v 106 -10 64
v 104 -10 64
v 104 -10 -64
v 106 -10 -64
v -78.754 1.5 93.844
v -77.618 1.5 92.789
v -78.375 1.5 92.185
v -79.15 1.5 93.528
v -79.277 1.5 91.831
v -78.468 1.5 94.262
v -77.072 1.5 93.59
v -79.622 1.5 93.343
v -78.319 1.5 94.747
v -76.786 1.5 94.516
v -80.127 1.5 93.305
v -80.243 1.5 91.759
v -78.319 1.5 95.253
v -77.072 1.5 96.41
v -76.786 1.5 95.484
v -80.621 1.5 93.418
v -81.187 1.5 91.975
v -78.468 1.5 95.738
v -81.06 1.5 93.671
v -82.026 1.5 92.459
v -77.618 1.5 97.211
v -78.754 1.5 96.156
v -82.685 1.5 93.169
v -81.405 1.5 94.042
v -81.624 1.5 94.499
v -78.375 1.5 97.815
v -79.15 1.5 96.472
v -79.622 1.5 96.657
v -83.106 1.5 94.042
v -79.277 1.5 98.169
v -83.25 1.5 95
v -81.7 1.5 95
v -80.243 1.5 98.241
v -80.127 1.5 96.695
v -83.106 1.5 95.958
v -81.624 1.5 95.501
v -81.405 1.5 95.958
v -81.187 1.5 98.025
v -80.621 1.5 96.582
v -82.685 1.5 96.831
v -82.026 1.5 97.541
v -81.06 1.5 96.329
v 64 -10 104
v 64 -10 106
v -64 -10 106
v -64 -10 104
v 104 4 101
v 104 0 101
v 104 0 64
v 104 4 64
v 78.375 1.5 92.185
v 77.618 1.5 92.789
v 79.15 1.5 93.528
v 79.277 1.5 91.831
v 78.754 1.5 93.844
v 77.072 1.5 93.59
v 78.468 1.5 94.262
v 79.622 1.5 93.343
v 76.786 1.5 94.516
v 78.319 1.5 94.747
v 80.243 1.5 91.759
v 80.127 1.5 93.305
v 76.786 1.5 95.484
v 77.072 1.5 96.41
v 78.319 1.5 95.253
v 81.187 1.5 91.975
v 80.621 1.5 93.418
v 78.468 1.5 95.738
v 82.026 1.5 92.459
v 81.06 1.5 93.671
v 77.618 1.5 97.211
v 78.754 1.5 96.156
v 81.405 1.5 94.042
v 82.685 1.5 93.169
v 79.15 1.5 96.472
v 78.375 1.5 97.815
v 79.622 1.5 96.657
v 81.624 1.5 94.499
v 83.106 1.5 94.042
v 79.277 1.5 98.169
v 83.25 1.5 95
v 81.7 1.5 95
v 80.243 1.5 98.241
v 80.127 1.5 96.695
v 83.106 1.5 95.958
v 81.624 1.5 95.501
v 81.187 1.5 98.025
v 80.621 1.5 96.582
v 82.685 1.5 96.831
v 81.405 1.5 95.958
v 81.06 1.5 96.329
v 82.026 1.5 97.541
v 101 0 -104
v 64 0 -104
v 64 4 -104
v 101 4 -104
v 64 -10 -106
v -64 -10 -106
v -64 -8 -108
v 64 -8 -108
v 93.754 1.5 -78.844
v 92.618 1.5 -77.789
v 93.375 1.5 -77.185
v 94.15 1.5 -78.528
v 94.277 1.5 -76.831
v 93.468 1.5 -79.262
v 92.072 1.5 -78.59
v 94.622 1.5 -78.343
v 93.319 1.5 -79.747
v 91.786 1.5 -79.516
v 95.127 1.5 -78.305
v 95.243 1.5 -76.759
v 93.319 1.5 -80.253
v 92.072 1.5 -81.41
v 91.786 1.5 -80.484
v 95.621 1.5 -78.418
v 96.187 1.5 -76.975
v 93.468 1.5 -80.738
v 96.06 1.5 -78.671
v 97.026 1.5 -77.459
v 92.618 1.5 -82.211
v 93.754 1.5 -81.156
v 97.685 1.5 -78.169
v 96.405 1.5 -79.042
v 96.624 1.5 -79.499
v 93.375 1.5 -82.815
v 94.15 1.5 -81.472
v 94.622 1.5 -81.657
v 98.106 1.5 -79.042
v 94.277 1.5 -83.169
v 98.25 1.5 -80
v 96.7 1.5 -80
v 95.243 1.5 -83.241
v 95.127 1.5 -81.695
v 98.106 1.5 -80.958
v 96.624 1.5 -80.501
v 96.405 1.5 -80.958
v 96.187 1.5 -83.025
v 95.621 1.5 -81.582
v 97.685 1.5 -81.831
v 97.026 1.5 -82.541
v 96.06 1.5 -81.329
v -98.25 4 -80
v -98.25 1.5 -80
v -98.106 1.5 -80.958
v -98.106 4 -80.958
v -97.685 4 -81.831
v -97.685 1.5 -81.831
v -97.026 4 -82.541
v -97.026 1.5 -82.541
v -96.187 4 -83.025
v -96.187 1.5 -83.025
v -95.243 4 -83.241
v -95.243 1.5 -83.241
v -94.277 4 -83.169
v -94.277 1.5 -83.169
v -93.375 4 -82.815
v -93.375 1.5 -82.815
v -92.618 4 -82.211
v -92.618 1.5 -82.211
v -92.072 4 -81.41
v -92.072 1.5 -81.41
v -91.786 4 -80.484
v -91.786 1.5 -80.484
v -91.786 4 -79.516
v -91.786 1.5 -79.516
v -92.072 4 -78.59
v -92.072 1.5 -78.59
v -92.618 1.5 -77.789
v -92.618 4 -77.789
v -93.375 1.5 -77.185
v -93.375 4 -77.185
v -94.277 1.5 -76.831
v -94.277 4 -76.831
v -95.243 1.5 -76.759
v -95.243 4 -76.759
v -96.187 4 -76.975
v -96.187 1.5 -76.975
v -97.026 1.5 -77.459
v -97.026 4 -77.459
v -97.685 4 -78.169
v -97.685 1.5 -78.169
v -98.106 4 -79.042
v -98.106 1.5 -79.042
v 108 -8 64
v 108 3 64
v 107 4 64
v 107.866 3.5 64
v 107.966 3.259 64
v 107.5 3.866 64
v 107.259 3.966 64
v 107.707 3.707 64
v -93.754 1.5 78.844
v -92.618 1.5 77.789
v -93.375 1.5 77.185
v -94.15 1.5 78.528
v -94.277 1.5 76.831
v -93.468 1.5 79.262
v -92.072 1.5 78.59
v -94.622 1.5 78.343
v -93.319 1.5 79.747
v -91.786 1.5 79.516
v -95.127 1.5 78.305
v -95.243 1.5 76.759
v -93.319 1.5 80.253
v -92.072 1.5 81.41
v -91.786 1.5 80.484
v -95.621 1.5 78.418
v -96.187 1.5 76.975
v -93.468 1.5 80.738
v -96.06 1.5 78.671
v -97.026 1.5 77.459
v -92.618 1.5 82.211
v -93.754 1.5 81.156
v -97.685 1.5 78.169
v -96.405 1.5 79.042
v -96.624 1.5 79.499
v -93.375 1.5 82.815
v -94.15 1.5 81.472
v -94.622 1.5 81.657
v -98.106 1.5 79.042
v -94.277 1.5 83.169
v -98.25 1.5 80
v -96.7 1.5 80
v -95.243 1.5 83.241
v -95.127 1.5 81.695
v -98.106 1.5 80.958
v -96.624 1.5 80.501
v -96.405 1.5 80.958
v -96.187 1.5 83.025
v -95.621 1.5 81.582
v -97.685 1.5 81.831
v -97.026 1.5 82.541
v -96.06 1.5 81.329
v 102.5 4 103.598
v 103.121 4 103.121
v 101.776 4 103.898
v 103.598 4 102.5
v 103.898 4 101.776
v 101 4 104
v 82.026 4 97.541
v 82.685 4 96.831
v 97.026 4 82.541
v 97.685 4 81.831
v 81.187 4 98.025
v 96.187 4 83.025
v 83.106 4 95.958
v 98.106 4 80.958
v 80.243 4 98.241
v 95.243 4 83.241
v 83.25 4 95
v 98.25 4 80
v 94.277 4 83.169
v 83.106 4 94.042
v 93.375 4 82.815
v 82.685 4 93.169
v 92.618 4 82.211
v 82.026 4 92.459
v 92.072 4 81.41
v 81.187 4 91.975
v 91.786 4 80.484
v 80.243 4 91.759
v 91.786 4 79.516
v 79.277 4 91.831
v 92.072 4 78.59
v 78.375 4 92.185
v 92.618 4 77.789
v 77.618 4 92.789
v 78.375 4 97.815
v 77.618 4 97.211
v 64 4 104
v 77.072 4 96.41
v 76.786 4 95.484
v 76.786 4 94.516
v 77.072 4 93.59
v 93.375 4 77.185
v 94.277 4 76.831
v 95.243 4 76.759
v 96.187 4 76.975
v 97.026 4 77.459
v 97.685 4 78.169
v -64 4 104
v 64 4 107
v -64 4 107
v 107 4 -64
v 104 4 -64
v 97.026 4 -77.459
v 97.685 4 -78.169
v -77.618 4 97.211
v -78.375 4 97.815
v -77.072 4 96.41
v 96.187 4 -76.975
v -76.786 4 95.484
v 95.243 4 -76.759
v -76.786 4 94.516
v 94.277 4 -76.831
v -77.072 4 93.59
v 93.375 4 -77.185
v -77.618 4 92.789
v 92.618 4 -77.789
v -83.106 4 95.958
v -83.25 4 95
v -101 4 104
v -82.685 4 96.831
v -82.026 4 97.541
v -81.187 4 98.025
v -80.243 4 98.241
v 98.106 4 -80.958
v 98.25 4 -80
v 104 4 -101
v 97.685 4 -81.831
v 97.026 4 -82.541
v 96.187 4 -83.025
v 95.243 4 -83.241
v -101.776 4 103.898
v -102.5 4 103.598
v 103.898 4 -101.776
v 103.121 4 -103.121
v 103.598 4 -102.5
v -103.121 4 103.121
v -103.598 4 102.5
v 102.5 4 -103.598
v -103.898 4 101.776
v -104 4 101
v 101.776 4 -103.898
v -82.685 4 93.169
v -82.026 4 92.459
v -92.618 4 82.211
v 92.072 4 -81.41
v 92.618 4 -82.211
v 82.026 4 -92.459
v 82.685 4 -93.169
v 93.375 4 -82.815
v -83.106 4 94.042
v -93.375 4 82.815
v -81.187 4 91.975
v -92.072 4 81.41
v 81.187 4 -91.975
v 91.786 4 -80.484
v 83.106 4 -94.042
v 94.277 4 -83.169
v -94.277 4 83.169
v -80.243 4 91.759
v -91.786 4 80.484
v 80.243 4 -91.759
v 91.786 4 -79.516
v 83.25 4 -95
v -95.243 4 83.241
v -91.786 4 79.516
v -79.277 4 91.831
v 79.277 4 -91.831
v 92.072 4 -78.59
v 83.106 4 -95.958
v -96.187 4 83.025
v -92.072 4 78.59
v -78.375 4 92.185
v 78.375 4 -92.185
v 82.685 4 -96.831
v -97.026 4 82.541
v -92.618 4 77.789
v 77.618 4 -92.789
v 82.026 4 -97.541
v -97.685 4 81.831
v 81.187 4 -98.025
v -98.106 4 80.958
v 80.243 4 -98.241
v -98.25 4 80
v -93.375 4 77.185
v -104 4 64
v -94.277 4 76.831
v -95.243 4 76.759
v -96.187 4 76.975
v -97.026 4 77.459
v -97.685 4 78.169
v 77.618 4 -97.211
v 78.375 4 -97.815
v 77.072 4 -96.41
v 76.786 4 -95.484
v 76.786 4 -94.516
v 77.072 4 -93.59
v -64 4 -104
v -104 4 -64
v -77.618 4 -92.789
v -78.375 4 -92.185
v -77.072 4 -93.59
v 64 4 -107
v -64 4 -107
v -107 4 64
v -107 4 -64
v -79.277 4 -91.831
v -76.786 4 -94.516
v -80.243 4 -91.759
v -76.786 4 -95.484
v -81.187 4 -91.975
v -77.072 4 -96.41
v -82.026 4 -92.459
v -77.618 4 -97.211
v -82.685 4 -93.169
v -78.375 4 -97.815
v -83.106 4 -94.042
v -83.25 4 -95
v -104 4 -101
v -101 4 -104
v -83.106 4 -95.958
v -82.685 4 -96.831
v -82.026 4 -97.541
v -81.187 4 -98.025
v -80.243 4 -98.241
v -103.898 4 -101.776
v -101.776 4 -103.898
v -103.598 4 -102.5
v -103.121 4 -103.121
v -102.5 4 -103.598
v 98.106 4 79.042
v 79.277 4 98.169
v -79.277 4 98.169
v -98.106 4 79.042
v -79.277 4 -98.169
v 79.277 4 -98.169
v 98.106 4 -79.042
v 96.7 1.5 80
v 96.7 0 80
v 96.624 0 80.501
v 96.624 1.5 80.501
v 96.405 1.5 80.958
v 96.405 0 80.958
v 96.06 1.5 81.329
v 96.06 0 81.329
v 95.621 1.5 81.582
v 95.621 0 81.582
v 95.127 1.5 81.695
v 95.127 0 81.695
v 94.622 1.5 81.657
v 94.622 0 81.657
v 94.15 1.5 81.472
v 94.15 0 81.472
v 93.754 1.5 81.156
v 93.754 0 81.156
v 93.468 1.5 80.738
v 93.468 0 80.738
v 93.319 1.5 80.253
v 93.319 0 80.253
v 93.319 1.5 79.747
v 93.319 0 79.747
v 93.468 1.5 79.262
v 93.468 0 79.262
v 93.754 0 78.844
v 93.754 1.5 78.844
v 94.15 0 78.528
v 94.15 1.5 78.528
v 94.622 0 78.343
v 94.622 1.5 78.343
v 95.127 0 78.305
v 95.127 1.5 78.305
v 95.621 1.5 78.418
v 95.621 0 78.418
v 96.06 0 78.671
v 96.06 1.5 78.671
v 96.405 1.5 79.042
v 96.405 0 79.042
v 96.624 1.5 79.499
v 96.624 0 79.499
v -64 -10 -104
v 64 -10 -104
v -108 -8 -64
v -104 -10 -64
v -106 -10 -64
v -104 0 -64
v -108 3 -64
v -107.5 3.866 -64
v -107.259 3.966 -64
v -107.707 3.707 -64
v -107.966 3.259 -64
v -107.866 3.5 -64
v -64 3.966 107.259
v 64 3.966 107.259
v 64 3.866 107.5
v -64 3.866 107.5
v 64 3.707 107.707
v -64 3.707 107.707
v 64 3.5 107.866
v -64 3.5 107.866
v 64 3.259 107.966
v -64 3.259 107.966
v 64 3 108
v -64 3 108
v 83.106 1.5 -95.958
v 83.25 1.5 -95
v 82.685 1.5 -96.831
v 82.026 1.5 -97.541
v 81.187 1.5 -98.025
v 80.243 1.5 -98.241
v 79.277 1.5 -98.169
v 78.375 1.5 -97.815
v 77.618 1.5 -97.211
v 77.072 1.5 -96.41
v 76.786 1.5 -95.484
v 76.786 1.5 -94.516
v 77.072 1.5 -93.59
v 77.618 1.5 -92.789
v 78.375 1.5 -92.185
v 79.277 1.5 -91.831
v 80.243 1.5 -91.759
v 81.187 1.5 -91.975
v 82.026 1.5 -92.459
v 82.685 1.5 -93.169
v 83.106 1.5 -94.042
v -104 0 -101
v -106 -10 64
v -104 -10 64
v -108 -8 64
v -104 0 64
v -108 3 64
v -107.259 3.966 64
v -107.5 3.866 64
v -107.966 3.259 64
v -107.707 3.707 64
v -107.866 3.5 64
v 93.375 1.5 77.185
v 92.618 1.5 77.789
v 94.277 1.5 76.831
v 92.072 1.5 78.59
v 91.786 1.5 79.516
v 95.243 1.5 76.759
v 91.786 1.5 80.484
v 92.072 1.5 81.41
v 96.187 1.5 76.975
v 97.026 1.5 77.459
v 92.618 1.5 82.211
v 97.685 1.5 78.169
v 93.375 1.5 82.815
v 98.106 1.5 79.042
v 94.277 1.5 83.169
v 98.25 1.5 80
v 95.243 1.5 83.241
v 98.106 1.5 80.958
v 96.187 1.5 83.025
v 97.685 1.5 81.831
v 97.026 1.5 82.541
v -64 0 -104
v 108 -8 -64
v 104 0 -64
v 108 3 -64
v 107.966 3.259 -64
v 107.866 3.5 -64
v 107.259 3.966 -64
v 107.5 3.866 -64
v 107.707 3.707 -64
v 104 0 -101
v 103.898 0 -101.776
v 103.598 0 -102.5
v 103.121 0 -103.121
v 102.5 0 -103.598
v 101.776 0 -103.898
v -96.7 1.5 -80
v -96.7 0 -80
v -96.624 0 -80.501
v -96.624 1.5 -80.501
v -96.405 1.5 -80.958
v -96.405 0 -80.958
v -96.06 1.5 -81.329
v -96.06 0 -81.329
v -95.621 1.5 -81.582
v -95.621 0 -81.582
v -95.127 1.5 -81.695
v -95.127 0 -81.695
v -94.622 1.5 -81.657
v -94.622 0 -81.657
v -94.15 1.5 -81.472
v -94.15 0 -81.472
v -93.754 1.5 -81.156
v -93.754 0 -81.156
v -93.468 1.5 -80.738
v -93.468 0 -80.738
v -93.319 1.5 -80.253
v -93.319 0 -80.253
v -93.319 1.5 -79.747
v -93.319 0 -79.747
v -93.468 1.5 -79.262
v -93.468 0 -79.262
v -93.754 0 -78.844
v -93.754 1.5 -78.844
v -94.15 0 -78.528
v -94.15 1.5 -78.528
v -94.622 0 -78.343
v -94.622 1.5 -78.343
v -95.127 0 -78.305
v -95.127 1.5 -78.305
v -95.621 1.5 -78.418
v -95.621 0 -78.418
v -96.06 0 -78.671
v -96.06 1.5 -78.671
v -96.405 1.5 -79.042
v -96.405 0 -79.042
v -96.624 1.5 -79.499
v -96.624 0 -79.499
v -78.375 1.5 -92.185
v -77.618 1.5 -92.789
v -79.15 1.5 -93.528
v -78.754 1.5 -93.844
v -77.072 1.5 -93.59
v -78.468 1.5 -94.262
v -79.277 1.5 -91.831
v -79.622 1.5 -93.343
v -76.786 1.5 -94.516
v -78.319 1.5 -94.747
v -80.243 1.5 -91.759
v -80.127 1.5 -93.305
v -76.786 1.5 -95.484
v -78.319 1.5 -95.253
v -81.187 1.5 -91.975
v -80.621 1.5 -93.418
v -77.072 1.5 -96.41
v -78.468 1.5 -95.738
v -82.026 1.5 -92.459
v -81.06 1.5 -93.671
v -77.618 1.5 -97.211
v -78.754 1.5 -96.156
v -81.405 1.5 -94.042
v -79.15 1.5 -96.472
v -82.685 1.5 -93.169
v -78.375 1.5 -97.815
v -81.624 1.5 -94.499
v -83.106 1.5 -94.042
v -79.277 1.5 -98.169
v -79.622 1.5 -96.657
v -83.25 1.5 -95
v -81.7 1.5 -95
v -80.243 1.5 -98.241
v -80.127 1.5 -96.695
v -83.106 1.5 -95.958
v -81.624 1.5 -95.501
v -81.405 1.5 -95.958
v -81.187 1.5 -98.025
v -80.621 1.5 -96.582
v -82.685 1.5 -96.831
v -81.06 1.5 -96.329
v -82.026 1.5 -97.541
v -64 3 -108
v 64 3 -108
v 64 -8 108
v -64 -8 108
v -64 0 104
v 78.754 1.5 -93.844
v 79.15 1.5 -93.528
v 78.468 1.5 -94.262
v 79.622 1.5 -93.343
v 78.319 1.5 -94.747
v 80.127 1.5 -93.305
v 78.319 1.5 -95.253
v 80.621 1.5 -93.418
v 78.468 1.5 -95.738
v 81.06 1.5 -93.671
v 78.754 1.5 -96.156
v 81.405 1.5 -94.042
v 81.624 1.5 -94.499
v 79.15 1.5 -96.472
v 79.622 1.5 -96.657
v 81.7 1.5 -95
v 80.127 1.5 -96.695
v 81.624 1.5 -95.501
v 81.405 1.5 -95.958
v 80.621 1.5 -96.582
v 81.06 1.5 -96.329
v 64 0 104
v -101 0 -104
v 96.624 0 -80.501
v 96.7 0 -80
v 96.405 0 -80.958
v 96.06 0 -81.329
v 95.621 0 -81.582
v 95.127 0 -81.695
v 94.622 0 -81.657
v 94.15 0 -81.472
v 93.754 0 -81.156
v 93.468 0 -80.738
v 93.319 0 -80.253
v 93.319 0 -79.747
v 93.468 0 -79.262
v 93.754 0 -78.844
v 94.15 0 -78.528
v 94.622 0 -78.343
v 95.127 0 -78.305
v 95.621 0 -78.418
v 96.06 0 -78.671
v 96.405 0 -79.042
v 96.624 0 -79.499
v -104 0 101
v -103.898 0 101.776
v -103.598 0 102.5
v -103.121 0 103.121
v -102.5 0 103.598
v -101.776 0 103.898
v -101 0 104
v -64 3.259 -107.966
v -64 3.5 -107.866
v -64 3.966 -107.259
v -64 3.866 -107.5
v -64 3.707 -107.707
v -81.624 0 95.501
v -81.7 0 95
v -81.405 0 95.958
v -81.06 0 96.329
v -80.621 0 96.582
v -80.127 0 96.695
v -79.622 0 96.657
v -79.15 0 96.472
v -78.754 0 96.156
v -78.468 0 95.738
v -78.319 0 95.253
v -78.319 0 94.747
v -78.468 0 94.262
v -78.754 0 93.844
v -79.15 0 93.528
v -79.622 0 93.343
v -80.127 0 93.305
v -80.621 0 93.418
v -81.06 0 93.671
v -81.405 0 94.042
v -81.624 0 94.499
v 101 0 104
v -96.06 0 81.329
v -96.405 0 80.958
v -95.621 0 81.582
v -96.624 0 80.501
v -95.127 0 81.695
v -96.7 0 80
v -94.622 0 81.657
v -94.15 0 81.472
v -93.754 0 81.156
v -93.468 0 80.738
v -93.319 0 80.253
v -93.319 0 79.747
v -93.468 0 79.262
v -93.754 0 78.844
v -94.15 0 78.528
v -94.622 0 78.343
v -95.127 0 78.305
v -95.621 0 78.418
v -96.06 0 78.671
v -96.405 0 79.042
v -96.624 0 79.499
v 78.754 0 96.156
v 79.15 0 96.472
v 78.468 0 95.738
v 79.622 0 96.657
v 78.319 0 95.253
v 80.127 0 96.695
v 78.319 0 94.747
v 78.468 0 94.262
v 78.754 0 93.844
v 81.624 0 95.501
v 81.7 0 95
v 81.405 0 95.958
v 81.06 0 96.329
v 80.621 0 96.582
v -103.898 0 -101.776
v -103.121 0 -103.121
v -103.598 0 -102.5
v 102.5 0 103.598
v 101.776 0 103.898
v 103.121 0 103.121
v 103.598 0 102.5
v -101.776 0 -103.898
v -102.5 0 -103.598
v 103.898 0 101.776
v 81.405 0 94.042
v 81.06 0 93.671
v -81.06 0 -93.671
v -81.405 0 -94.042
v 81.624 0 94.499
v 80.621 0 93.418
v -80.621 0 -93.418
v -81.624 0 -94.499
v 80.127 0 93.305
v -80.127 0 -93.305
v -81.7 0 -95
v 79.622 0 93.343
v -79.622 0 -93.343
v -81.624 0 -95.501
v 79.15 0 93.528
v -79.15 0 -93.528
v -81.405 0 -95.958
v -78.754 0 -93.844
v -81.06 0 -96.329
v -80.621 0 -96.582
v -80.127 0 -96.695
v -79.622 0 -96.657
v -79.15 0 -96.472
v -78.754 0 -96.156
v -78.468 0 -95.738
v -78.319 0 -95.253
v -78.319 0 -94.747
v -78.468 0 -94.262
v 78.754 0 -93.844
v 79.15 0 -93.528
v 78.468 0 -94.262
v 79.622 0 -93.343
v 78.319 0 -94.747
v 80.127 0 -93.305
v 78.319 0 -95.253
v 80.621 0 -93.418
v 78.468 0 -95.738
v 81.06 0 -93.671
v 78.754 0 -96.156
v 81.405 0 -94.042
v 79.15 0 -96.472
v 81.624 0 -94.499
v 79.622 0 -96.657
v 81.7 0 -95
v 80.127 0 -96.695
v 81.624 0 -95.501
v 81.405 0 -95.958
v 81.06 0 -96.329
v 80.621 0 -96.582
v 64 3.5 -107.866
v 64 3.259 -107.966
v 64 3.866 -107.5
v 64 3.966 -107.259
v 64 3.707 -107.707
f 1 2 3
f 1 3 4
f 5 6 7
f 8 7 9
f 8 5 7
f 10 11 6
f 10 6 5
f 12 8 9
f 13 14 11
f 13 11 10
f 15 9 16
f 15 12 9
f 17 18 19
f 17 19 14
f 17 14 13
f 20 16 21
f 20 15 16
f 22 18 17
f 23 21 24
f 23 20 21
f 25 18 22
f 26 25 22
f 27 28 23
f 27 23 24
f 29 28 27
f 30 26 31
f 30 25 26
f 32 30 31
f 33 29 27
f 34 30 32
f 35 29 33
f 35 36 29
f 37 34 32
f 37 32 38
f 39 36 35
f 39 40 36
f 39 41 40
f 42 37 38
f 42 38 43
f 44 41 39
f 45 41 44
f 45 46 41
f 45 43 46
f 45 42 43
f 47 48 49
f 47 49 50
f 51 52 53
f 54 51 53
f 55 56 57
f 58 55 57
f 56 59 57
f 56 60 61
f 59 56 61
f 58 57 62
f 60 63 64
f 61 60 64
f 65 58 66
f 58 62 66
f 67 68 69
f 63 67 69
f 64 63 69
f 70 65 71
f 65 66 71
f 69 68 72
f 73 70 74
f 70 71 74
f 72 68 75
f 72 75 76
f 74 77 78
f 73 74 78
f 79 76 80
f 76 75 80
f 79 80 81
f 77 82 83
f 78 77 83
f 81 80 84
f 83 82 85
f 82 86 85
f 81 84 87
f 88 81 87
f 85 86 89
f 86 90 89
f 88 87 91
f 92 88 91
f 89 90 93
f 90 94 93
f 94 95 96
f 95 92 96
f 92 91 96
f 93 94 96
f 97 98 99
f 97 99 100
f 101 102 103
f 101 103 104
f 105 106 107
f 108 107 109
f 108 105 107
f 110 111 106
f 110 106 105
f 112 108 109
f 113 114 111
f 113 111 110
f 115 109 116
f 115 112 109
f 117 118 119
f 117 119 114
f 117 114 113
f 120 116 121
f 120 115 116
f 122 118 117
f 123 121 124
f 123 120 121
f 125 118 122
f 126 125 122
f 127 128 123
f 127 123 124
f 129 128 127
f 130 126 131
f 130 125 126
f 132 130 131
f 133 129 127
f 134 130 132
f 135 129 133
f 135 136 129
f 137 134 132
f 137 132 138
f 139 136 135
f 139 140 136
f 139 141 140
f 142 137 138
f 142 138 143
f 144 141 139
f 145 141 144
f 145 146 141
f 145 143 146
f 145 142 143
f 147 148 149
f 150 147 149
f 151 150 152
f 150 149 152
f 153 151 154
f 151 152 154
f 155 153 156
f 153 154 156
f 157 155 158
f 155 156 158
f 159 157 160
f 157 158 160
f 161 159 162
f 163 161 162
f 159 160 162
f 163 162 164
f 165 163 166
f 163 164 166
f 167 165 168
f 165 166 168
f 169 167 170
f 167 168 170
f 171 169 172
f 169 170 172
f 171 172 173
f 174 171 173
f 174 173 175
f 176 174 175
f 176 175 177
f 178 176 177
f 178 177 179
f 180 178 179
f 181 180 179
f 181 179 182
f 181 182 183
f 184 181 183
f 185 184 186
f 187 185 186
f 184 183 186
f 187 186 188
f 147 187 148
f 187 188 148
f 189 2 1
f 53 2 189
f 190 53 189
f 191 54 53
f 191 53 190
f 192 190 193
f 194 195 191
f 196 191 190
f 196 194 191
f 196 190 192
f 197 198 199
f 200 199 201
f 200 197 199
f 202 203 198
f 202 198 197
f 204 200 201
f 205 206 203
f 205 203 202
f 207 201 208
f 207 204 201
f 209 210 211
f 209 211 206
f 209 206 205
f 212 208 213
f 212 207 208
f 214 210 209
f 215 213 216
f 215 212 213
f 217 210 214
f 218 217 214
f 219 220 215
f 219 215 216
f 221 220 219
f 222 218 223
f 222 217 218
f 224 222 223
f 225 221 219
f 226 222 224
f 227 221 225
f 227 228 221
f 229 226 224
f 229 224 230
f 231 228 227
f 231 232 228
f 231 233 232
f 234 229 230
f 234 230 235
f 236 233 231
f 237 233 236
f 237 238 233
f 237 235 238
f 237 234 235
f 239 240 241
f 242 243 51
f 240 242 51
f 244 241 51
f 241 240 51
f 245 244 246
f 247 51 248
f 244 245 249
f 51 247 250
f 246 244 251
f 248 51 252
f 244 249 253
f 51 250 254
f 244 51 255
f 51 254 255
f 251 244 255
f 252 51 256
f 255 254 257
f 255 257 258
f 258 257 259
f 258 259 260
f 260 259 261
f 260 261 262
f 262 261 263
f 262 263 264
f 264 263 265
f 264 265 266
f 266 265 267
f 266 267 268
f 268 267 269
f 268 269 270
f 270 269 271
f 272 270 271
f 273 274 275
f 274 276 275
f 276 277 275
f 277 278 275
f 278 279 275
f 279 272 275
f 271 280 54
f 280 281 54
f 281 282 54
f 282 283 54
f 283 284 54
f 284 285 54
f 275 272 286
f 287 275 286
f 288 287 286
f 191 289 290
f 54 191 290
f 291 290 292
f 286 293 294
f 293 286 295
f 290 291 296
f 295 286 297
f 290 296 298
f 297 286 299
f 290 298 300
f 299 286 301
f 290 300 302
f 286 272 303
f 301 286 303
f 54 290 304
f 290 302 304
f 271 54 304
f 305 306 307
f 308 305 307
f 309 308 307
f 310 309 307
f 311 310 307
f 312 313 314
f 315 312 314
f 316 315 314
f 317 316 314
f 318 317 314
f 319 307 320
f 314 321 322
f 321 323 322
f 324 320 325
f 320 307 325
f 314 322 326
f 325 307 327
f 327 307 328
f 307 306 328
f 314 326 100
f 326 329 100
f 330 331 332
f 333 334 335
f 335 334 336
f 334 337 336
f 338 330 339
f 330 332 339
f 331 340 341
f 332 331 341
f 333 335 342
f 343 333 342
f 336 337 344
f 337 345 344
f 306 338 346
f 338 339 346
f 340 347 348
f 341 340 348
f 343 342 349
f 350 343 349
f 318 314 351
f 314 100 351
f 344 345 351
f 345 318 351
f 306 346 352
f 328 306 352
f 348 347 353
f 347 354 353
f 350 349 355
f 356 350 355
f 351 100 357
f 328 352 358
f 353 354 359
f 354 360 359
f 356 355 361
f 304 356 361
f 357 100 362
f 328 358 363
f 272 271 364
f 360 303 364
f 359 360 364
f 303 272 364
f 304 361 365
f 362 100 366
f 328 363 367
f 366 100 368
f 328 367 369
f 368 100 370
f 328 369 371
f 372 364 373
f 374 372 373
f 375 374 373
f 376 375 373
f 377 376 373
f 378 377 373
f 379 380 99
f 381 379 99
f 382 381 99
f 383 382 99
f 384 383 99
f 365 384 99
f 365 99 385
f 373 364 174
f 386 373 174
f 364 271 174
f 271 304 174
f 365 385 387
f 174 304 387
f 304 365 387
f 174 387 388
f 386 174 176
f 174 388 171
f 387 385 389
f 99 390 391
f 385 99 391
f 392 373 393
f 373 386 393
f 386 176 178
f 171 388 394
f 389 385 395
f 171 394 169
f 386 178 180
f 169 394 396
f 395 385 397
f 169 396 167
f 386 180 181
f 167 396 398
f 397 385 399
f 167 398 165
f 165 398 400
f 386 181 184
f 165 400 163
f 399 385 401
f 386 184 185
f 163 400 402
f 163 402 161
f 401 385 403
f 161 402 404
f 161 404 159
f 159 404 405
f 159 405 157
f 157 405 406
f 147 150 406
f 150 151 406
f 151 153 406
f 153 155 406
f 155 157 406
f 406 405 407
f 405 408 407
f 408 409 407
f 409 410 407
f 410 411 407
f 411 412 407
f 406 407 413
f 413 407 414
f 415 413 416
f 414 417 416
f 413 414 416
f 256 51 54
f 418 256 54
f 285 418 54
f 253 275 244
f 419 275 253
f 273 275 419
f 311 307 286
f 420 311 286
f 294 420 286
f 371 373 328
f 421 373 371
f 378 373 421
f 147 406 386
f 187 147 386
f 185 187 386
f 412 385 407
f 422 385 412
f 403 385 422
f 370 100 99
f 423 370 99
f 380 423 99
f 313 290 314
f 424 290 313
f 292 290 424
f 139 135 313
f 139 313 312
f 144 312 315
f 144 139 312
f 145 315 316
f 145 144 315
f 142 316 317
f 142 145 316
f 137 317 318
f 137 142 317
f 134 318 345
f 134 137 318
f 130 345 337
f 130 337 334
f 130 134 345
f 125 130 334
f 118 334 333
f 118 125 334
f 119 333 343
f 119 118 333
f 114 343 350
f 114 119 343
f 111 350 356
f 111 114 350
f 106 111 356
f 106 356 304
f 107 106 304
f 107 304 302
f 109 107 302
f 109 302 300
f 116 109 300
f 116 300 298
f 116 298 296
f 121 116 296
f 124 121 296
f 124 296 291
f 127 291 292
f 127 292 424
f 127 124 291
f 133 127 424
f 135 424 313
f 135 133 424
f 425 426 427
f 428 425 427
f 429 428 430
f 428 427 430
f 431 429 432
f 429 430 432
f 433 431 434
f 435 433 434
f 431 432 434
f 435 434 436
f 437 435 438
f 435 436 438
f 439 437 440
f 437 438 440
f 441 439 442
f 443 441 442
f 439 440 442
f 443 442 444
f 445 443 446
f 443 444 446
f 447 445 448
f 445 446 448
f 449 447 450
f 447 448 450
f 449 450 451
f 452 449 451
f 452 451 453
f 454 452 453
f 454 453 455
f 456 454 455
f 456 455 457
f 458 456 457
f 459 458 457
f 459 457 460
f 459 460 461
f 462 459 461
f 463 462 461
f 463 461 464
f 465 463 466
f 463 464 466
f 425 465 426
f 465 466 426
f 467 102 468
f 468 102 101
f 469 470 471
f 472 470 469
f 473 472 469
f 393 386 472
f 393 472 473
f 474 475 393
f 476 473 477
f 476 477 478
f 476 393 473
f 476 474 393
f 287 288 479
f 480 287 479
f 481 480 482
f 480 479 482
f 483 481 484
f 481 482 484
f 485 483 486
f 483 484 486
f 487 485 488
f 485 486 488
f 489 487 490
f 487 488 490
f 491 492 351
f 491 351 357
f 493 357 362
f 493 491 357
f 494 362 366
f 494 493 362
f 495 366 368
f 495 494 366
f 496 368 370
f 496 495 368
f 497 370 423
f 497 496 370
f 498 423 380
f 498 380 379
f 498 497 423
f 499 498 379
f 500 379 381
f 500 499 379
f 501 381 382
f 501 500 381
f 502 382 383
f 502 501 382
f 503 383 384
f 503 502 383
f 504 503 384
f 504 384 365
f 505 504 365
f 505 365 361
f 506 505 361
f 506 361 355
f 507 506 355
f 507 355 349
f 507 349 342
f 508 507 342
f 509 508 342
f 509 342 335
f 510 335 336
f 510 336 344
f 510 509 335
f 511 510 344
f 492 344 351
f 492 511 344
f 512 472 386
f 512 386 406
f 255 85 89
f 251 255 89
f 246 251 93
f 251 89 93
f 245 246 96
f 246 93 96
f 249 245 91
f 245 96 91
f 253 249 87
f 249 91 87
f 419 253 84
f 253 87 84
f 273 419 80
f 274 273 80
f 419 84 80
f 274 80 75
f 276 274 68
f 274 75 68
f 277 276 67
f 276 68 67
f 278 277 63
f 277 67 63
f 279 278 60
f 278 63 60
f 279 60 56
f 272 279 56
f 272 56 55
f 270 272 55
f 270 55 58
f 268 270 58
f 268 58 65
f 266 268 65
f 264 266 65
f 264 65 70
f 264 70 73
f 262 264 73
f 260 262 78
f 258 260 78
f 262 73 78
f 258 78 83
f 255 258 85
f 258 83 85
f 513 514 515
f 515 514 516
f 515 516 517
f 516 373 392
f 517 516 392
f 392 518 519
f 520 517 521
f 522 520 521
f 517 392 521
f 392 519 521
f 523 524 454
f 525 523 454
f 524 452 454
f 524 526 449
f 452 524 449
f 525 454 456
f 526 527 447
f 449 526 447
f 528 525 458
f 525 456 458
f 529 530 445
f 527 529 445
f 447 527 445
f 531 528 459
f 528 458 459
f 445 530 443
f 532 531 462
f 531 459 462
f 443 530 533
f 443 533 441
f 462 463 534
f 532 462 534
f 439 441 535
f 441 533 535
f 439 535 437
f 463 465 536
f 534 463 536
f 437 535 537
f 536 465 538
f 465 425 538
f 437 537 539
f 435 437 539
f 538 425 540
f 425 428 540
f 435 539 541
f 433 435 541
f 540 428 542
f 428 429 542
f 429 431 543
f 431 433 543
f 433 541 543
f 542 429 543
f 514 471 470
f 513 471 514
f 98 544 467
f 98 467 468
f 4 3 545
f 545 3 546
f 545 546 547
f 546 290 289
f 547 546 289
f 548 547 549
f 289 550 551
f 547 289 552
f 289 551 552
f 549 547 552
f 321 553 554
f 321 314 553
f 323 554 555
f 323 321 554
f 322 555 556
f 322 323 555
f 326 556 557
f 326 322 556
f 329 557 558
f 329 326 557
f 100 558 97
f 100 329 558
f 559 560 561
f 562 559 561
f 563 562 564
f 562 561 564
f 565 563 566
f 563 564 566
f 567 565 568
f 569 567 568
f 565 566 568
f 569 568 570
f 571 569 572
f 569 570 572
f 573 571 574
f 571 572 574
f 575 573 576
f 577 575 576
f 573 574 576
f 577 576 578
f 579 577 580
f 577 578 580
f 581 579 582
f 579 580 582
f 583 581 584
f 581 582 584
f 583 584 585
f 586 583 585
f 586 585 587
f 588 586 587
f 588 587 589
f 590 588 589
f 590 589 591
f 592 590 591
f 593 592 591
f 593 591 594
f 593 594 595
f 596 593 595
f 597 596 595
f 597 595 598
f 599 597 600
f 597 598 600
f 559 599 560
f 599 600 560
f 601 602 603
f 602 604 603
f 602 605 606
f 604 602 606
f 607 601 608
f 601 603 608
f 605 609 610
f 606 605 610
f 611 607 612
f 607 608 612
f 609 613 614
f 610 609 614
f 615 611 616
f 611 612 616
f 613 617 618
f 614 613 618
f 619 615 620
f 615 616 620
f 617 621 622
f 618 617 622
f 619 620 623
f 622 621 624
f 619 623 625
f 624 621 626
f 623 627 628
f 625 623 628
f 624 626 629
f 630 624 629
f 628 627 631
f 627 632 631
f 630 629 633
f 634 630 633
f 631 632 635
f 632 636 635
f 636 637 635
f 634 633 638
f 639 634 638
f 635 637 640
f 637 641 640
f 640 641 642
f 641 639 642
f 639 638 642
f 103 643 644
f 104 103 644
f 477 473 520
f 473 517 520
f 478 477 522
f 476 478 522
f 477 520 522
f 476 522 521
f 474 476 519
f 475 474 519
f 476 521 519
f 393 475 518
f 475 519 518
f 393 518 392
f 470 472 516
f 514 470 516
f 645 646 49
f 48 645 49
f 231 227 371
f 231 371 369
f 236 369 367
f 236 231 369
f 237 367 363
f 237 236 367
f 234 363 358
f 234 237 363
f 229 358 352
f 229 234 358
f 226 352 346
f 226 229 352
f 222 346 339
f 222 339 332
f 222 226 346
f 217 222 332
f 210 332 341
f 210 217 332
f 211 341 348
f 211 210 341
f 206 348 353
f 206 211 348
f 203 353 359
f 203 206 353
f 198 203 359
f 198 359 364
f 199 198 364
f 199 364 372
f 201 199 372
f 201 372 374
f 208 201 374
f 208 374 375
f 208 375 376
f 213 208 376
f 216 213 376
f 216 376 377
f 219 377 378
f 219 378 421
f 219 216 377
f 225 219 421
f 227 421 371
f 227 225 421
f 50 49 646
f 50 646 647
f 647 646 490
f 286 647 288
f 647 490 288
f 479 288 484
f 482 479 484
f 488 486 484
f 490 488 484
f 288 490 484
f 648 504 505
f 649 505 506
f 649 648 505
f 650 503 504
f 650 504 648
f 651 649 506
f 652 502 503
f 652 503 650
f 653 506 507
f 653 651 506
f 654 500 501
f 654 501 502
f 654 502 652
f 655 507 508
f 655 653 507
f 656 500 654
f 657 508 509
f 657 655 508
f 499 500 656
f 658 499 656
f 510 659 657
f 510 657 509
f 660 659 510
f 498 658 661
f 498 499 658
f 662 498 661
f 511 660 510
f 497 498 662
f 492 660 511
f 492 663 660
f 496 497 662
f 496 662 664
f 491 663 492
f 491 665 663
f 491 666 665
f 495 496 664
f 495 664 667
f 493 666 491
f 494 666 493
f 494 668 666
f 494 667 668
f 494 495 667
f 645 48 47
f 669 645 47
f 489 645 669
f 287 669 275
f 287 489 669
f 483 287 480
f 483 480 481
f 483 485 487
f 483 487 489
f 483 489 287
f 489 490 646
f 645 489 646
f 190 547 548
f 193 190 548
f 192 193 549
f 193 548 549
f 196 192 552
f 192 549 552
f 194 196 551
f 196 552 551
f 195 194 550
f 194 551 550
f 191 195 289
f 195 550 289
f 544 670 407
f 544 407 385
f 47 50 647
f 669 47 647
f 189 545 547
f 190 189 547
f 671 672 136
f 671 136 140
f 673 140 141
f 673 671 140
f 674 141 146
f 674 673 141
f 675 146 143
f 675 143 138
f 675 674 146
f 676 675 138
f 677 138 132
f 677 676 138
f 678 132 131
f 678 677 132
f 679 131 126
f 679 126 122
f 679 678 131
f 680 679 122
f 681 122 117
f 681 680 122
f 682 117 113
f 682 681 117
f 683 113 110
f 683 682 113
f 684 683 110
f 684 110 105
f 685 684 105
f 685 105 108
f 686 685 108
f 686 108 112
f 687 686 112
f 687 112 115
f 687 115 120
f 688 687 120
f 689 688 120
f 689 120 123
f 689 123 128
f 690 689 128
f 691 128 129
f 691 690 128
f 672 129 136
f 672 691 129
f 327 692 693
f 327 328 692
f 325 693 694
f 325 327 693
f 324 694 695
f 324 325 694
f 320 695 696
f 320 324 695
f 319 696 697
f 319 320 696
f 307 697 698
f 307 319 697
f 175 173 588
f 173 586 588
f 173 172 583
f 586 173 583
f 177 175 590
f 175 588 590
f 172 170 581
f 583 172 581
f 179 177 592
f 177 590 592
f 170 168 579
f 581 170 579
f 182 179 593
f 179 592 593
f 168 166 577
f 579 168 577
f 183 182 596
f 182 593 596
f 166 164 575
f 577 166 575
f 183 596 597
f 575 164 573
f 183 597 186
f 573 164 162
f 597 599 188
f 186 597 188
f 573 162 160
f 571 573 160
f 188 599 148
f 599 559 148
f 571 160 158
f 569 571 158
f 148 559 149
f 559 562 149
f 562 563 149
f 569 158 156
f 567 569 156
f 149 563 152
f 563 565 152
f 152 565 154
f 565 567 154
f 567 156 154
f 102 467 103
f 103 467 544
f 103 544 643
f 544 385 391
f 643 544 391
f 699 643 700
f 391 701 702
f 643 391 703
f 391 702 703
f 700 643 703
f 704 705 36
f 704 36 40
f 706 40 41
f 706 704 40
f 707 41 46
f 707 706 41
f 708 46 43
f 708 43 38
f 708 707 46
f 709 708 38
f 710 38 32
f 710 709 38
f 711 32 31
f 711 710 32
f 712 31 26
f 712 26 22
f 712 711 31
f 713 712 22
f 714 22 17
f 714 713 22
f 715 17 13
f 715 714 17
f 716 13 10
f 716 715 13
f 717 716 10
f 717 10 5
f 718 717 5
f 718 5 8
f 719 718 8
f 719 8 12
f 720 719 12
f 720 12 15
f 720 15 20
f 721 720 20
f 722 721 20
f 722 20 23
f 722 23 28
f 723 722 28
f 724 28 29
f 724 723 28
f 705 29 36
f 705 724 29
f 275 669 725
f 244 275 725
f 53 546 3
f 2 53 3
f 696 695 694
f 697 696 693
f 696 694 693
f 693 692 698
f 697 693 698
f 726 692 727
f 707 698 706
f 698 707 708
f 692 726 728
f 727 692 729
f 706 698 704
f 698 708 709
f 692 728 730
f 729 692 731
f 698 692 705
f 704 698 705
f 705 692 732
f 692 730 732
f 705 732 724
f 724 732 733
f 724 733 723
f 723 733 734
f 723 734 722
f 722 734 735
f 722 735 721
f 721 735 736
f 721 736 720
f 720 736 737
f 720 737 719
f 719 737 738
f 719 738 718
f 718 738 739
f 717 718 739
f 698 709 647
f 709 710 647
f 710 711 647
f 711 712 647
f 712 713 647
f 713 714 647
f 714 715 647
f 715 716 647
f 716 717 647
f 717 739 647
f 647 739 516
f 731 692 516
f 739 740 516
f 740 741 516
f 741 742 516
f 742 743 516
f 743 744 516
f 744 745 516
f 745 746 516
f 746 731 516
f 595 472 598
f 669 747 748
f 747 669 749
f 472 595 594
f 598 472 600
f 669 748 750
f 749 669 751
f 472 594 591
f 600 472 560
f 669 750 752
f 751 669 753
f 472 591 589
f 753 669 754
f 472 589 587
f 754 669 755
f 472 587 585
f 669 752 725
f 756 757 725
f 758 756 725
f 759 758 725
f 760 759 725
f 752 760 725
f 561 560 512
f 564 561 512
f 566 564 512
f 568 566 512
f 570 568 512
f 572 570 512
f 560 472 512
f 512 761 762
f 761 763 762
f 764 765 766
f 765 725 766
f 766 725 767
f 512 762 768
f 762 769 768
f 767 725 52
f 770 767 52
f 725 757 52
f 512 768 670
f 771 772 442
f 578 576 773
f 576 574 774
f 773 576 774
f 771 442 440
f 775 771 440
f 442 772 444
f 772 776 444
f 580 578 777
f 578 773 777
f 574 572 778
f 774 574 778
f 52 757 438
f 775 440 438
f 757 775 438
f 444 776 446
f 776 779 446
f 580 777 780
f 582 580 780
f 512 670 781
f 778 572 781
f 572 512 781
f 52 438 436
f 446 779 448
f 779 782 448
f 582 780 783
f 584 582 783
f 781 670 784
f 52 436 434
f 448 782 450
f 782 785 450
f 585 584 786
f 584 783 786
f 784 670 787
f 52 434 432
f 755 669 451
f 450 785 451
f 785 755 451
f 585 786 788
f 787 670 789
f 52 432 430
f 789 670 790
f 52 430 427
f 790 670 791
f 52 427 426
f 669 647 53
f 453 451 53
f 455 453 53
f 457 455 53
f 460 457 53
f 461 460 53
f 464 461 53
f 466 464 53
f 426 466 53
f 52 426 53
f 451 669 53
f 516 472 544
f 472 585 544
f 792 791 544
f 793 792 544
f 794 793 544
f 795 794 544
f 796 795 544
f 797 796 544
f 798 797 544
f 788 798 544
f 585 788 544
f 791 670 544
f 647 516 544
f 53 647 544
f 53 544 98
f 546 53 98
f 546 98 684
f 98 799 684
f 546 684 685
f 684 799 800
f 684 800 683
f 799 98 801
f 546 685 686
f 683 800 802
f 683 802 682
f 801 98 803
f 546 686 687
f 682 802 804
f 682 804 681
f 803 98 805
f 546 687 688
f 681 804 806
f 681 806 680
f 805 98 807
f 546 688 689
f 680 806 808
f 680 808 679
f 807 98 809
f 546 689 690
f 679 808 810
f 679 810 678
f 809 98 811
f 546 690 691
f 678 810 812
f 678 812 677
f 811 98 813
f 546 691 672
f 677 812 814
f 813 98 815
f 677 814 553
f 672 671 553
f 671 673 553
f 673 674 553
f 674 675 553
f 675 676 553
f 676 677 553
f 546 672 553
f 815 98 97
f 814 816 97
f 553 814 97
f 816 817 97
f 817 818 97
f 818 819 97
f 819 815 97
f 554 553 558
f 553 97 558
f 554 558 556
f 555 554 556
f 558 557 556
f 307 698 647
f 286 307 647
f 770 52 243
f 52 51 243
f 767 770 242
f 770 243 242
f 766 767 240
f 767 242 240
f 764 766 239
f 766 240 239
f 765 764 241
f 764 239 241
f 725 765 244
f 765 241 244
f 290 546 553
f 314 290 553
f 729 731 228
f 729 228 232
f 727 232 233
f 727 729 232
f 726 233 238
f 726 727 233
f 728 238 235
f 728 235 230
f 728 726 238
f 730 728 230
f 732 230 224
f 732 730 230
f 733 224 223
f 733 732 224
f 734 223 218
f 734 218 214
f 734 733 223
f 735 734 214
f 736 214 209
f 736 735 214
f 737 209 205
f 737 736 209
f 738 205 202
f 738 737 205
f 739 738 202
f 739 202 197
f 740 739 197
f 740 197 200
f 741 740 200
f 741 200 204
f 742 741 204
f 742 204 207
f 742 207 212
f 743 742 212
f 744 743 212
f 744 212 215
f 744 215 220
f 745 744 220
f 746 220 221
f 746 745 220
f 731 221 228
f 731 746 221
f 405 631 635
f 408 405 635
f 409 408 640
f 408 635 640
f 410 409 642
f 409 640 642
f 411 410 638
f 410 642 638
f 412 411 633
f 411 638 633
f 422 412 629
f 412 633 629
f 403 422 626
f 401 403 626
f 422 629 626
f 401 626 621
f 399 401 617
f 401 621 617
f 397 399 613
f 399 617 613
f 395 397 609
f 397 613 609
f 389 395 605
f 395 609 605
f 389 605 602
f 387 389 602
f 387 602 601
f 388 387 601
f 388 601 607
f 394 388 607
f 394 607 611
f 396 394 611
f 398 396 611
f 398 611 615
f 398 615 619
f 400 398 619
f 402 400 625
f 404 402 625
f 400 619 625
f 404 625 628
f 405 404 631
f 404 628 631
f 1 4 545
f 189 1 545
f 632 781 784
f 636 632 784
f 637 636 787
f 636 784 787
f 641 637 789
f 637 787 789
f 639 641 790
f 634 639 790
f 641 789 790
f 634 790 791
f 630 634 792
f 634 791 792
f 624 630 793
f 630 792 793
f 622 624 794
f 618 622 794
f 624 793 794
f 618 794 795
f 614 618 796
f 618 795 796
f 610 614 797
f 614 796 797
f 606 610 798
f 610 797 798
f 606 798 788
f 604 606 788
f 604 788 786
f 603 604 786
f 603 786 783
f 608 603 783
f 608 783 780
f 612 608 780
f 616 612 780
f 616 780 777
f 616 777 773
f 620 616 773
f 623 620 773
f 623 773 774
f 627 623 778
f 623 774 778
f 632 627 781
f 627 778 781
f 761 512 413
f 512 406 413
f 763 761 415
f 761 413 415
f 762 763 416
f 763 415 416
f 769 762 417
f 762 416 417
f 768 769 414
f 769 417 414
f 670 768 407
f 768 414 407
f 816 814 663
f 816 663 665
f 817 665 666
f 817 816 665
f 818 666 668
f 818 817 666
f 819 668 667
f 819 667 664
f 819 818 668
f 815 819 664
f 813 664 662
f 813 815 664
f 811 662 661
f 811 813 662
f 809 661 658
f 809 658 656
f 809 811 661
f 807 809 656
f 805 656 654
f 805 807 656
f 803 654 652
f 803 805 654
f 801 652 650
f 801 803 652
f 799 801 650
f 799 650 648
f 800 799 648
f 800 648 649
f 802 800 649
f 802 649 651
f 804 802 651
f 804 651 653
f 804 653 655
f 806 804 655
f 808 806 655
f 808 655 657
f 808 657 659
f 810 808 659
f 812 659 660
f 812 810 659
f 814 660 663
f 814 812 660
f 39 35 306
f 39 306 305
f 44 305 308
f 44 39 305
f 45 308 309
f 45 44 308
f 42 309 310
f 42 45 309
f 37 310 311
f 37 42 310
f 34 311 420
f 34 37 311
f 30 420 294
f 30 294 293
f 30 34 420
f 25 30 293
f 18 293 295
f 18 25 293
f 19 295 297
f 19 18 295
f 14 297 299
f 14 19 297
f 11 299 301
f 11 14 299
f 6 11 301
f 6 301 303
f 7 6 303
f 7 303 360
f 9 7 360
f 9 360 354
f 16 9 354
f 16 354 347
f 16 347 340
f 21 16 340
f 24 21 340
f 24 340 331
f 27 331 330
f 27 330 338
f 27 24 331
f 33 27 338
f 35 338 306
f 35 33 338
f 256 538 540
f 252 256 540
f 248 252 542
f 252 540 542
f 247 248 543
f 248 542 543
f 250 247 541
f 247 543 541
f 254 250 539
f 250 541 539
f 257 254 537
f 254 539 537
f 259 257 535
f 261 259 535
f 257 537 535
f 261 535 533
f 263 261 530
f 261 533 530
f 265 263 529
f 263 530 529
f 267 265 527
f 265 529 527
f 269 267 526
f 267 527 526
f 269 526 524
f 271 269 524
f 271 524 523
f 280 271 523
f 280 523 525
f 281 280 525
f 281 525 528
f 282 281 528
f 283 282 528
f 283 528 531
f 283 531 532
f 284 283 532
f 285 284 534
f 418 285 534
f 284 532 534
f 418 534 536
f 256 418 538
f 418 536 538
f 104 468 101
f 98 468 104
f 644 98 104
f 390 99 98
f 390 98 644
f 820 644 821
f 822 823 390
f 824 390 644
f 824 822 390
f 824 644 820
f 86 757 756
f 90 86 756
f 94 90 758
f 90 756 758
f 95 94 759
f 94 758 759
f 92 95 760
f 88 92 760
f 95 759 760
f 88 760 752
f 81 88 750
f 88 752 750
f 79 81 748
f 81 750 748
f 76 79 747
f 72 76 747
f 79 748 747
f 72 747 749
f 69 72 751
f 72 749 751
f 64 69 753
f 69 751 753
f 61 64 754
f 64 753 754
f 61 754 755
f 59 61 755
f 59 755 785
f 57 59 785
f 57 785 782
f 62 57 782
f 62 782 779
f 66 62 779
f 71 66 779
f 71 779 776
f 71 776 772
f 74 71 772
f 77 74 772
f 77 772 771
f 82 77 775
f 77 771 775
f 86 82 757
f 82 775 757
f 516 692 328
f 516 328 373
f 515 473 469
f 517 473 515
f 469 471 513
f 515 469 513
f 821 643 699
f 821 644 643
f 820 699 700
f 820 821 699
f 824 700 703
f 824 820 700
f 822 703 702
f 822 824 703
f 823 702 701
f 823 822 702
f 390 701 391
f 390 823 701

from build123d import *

# Parameters (mm, degrees)
SKETCH1_W                                     = 208
SKETCH1_H                                     = 208
BASE_PLATE_DEPTH                              = 4
MOUNTING_HOLES_START                          = 1.5
MOUNTING_HOLES_OUTLINE_R                      = 3.25
MOUNTING_HOLES_DEPTH                          = 2.5
MOUNTING_HOLES_2_OUTLINE_R                    = 1.7
MOUNTING_HOLES_2_DEPTH                        = 1.5
MOUNTING_HOLES_MIRROR2_START                  = 1.5
MOUNTING_HOLES_MIRROR2_COPY_1_SKETCH_R        = 3.25
MOUNTING_HOLES_MIRROR2_COPY_1_DEPTH           = 2.5
MOUNTING_HOLES_MIRROR2_COPY_2_SKETCH_R        = 1.7
MOUNTING_HOLES_MIRROR2_COPY_2_DEPTH           = 1.5
MOUNTING_HOLES_MIRROR2_COPY_3_SKETCH_R        = 1.7
MOUNTING_HOLES_MIRROR2_COPY_3_DEPTH           = 1.5
SKETCH5_W                                     = 128
SKETCH5_H                                     = 4
SIDE_EXTRUSION_DEPTH                          = 14
SIDE_EXTRUSION_FILLET_R                       = 1
SIDE_EXTRUSION_CHAMFER_SIZE                   = 2
SIDE_EXTRUSION_FILLET_OF_SIDE_EXTRUSION_R     = 1
SIDE_EXTRUSION_CHAMFER_OF_SIDE_EXTRUSION_SIZE = 2
SIDE_EXTRUSION_MIRROR2_START                  = -64
SIDE_EXTRUSION_MIRROR2_DEPTH                  = 128
SIDE_EXTRUSION_MIRROR2_2_DEPTH                = 128
EDGE_FILLETS_R                                = 3


# Read off the part's stored shape, not the designer's step: mounting_holes, side_extrusion_mirror2
with BuildPart() as part:
    # Sketch1 → base_plate (new body)
    with BuildSketch(Plane(origin=(0, 0, 0), x_dir=(1, 0, 0), z_dir=(0, 1, 0))):
        Rectangle(SKETCH1_W, SKETCH1_H)
    extrude(amount=BASE_PLATE_DEPTH)

    # mounting_holes outline → mounting_holes (cut)
    with BuildSketch(Plane(origin=(0, 0, 0), x_dir=(1, 0, 0), z_dir=(0, 1, 0)).offset(MOUNTING_HOLES_START)):
        with Locations((95, 80)):
            Circle(MOUNTING_HOLES_OUTLINE_R)
        with Locations((80, 95)):
            Circle(MOUNTING_HOLES_OUTLINE_R)
    mounting_holes = extrude(amount=MOUNTING_HOLES_DEPTH, mode=Mode.SUBTRACT)

    # mounting_holes 2 outline → mounting_holes 2 (cut)
    with BuildSketch(Plane(origin=(0, 0, 0), x_dir=(1, 0, 0), z_dir=(0, 1, 0))):
        with Locations((95, 80)):
            Circle(MOUNTING_HOLES_2_OUTLINE_R)
        with Locations((80, 95)):
            Circle(MOUNTING_HOLES_2_OUTLINE_R)
    mounting_holes_2 = extrude(amount=MOUNTING_HOLES_2_DEPTH, mode=Mode.SUBTRACT)

    # mounting_holes_mirror1: mounting_holes, mounting_holes 2 across plane
    add(mounting_holes.mirror(Plane.XY), mode=Mode.SUBTRACT)
    add(mounting_holes_2.mirror(Plane.XY), mode=Mode.SUBTRACT)

    # mounting_holes_mirror2: mounting_holes, mounting_holes 2 across plane
    add(mounting_holes.mirror(Plane(origin=(0, 0, 0), x_dir=(0, 0, 1), z_dir=(1, 0, 0))), mode=Mode.SUBTRACT)
    add(mounting_holes_2.mirror(Plane(origin=(0, 0, 0), x_dir=(0, 0, 1), z_dir=(1, 0, 0))), mode=Mode.SUBTRACT)

    # mounting_holes_mirror2 copy 1 sketch → mounting_holes_mirror2 copy 1 (cut)
    with BuildSketch(Plane(origin=(0, 0, 0), x_dir=(-1, 0, 0), z_dir=(0, 1, 0)).offset(MOUNTING_HOLES_MIRROR2_START)):
        with Locations((95, 80)):
            Circle(MOUNTING_HOLES_MIRROR2_COPY_1_SKETCH_R)
        with Locations((80, 95)):
            Circle(MOUNTING_HOLES_MIRROR2_COPY_1_SKETCH_R)
    extrude(amount=MOUNTING_HOLES_MIRROR2_COPY_1_DEPTH, mode=Mode.SUBTRACT)

    # mounting_holes_mirror2 copy 2 sketch → mounting_holes_mirror2 copy 2 (cut)
    with BuildSketch(Plane(origin=(0, 0, 0), x_dir=(-1, 0, 0), z_dir=(0, 1, 0))):
        with Locations((95, 80)):
            Circle(MOUNTING_HOLES_MIRROR2_COPY_2_SKETCH_R)
        with Locations((80, 95)):
            Circle(MOUNTING_HOLES_MIRROR2_COPY_2_SKETCH_R)
    extrude(amount=MOUNTING_HOLES_MIRROR2_COPY_2_DEPTH, mode=Mode.SUBTRACT)

    # mounting_holes_mirror2 copy 3 sketch → mounting_holes_mirror2 copy 3 (cut)
    with BuildSketch(Plane(origin=(0, 0, 0), x_dir=(-1, 0, 0), z_dir=(0, 1, 0))):
        with Locations((95, -80)):
            Circle(MOUNTING_HOLES_MIRROR2_COPY_3_SKETCH_R)
        with Locations((80, -95)):
            Circle(MOUNTING_HOLES_MIRROR2_COPY_3_SKETCH_R)
    extrude(amount=MOUNTING_HOLES_MIRROR2_COPY_3_DEPTH, mode=Mode.SUBTRACT)

    # Sketch5 → side_extrusion (add)
    with BuildSketch(Plane(origin=(0, 4, 0), x_dir=(1, 0, 0), z_dir=(0, 1, 0))):
        with Locations((0, 106)):
            Rectangle(SKETCH5_W, SKETCH5_H)
    side_extrusion = extrude(amount=-SIDE_EXTRUSION_DEPTH)

    # side_extrusion_fillet
    side_extrusion_fillet_edges = [part.edges().sort_by_distance(p)[0] for p in [
        (0, 4, -108),
    ]]
    fillet(side_extrusion_fillet_edges, radius=SIDE_EXTRUSION_FILLET_R)

    # side_extrusion_chamfer
    side_extrusion_chamfer_edges = [part.edges().sort_by_distance(p)[0] for p in [
        (0, -10, -108),
    ]]
    chamfer(side_extrusion_chamfer_edges, length=SIDE_EXTRUSION_CHAMFER_SIZE)

    # side_extrusion_mirror1: side_extrusion across plane
    add(side_extrusion.mirror(Plane(origin=(0, 0, 0), x_dir=(0.7071067811865476, 0, 0.7071067811865476), z_dir=(0.7071067811865477, 0, -0.7071067811865475))))

    # side_extrusion_fillet of side_extrusion
    side_extrusion_fillet_of_side_extrusion_edges = [part.edges().sort_by_distance(p)[0] for p in [
        (-108, 4, 0),
    ]]
    fillet(side_extrusion_fillet_of_side_extrusion_edges, radius=SIDE_EXTRUSION_FILLET_OF_SIDE_EXTRUSION_R)

    # side_extrusion_chamfer of side_extrusion
    side_extrusion_chamfer_of_side_extrusion_edges = [part.edges().sort_by_distance(p)[0] for p in [
        (-108, -10, 0),
    ]]
    chamfer(side_extrusion_chamfer_of_side_extrusion_edges, length=SIDE_EXTRUSION_CHAMFER_OF_SIDE_EXTRUSION_SIZE)

    # side_extrusion_mirror2 outline → side_extrusion_mirror2 (add)
    with BuildSketch(Plane.YZ.offset(SIDE_EXTRUSION_MIRROR2_START)):
        with BuildLine():
            Line((-8, 108), (-10, 106))
            Line((-10, 106), (-10, 104))
            Line((-10, 104), (4, 104))
            Line((4, 104), (4, 107))
            ThreePointArc((4, 107), (3.707106781, 107.707106781), (3, 108))
            Line((3, 108), (-8, 108))
        make_face()
    extrude(amount=SIDE_EXTRUSION_MIRROR2_DEPTH)

    # side_extrusion_mirror2 2 outline → side_extrusion_mirror2 2 (add)
    with BuildSketch(Plane.XY.offset(SIDE_EXTRUSION_MIRROR2_START)):
        with BuildLine():
            Line((104, 4), (104, -10))
            Line((104, -10), (106, -10))
            Line((106, -10), (108, -8))
            Line((108, -8), (108, 3))
            ThreePointArc((108, 3), (107.707106781, 3.707106781), (107, 4))
            Line((107, 4), (104, 4))
        make_face()
    extrude(amount=SIDE_EXTRUSION_MIRROR2_2_DEPTH)

    # edge_fillets
    edge_fillets_edges = [part.edges().sort_by_distance(p)[0] for p in [
        (104, 2, 104),
        (-104, 2, 104),
        (-104, 2, -104),
        (104, 2, -104),
    ]]
    fillet(edge_fillets_edges, radius=EDGE_FILLETS_R)


solid = part.part
